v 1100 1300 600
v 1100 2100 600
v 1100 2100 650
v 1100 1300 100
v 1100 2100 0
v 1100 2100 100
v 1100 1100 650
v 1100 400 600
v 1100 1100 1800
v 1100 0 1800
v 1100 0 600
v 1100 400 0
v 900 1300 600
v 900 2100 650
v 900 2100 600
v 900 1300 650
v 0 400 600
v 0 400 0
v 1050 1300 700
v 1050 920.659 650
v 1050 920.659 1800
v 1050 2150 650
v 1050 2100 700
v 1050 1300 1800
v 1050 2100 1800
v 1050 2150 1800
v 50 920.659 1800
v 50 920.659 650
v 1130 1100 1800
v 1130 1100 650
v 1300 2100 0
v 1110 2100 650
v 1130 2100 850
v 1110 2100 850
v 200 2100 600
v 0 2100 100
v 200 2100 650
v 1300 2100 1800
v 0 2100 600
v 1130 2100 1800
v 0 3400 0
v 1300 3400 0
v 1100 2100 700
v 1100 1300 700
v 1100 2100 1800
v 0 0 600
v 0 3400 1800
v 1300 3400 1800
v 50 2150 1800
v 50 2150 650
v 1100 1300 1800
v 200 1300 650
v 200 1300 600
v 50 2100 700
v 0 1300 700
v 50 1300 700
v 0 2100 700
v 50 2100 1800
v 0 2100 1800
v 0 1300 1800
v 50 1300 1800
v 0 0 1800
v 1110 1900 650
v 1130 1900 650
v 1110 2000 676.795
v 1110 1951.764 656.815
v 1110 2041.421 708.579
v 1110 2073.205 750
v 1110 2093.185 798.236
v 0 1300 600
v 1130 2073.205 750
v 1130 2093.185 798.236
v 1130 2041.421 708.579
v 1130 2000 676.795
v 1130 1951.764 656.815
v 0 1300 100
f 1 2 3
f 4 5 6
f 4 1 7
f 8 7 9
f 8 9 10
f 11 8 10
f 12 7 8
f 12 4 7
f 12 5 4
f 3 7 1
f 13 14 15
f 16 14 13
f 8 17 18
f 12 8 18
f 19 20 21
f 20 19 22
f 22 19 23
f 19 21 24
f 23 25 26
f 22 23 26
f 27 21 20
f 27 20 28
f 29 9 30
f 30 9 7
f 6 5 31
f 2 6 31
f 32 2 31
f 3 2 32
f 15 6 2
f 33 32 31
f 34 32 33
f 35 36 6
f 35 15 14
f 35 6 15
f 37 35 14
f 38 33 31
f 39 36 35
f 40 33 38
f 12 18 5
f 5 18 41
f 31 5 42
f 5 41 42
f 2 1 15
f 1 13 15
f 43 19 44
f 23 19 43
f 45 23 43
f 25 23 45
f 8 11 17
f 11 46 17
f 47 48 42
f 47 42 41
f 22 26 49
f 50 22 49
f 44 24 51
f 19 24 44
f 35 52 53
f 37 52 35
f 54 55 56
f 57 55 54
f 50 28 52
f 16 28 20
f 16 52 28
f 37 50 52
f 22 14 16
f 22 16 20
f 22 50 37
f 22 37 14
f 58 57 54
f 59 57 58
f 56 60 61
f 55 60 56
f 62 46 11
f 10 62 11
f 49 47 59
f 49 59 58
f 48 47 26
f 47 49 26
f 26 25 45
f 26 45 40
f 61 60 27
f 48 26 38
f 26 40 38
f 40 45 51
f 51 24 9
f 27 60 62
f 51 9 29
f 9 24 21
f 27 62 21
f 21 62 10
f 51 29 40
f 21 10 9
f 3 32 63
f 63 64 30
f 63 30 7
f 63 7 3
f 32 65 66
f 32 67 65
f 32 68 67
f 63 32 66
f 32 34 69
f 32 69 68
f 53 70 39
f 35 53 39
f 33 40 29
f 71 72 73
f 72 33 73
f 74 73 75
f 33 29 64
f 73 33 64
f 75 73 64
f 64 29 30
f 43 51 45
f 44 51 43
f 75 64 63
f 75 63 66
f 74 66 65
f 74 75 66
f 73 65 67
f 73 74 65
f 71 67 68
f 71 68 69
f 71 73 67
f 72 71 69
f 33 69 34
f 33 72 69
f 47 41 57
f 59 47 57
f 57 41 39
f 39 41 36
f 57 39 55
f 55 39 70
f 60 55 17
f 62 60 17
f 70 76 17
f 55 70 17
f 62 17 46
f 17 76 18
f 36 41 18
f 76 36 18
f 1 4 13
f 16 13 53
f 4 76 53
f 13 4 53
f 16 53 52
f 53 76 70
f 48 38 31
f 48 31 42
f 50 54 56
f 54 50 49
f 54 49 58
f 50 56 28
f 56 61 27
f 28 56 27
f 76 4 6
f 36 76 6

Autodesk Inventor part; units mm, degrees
ref_plane "YZ Plane" through (0, 0, 0) normal (1, 0, 0) x (0, 1, 0)
ref_plane "XZ Plane" through (0, 0, 0) normal (0, 1, 0) x (-1, 0, 0)
ref_plane "XY Plane" through (0, 0, 0) normal (0, 0, 1) x (1, 0, 0)
sketch "Sketch1" plane through (0, 0, 0) normal (0, 0, 1) x (1, 0, 0)
  line L0 (0, 0) -> (1300, 0)
  line L1 (1300, 3400) -> (0, 3400)
  line L2 (0, 3400) -> (0, 0)
  line L3 (1300, 2100) -> (1100, 2100)
  line L4 (1100, 2100) -> (1100, 0)
  line L5 (1300, 2100) -> (1300, 3400)
  dimension "d0" = 1300
extrude "Extrusion1" add sketch "Sketch1" along normal blind 1800
sketch "Sketch2" plane through (0, 0, 0) normal (-1, 0, 0) x (0, 0, 1)
  line L0 (0, 0) -> (1800, 0) projected
  line L1 (0, 0) -> (600, 0)
  line L2 (600, 0) -> (600, 400)
  line L3 (600, 400) -> (0, 400)
  line L4 (0, 400) -> (0, 0)
  line L5 (0, 3400) -> (1800, 3400) projected
  line L6 (0, 1300) -> (600, 1300)
  line L7 (600, 1300) -> (600, 2100)
  line L8 (600, 2100) -> (0, 2100)
  line L9 (0, 2100) -> (0, 1300)
  line L10 (600, 1300) -> (100, 1300)
  line L11 (100, 1300) -> (100, 2100)
  line L12 (100, 2100) -> (600, 2100)
  line L13 (600, 2100) -> (600, 1300)
  line L14 (600, 1300) -> (600, 400)
  line L15 (700, 2100) -> (1800, 2100)
  line L16 (1800, 2100) -> (1800, 1300)
  line L17 (1800, 1300) -> (700, 1300)
  line L18 (700, 1300) -> (700, 2100)
  dimension "d4" = 600
  dimension "d5" = 400
  dimension "d13" = 600
  dimension "d14" = 800
  dimension "d15" = 500
  dimension "d21" = 900
  dimension "d25" = 800
extrude "Extrusion2" cut sketch "Sketch2" against normal blind 1800 contours L4 L3 L2 L0 | L6 L11 L8 L7 | L15 L16 L17 L18
sketch "Sketch3" plane through (0, 0, 1800) normal (0, 0, 1) x (1, 0, 0)
  line L0 (50, 2150) -> (50, 920.6593)
  line L1 (1050, 920.6593) -> (1050, 2150)
  line L2 (1050, 2100) -> (1050, 2150)
  line L3 (1100, 2100) -> (1300, 2100) projected
  line L4 (1300, 2100) -> (1250, 2100)
  line L5 (1050, 2150) -> (50, 2150)
  line L6 (1050, 920.6593) -> (50, 920.6593)
extrude "Extrusion3" cut sketch "Sketch3" against normal blind 1150
sketch "Sketch6" plane through (0, 0, 650) normal (0, 0, 1) x (1, 0, 0)
  line L0 (1050, 1300) -> (1050, 2100) projected
  line L1 (0, 2100) -> (1100, 2100) projected
  line L2 (1050, 1300) -> (50, 1300)
  line L3 (50, 1300) -> (50, 2100)
  line L4 (50, 2100) -> (1050, 2100)
  line L5 (1050, 2100) -> (1050, 1300)
  line L6 (1050, 1700) -> (900, 1700)
  line L7 (900, 1700) -> (900, 2100)
  line L8 (900, 1700) -> (900, 1300)
  line L9 (50, 1700) -> (200, 1700)
  line L10 (200, 1700) -> (200, 1300)
  line L11 (200, 1700) -> (200, 2100)
  point P0 (0, 0)
  point P1 (1050, 49.9974)
  dimension "d32" = 1000
  dimension "d33" = 150
  dimension "d34" = 150
extrude "Extrusion6" cut sketch "Sketch6" against normal blind 150 contours L2 L10 L11 L1 L7 L8
sketch "Sketch7" plane through (1100, 400, 0) normal (1, 0, 0) x (0, 0, -1)
  line L0 (-1800, 700) -> (-650, 700)
  line L1 (-650, 520.6593) -> (-650, 1750) projected
  line L2 (-650, 720) -> (-650, 700)
  line L3 (-650, 720) -> (-1800, 720)
  line L4 (-1800, 900) -> (-1800, -400) projected
  line L5 (-1800, 700) -> (-1800, 720)
  point P0 (0, -400)
  point P1 (-650, -350.0026)
  point P2 (-650, 2950)
extrude "Extrusion7" add sketch "Sketch7" along normal blind 30
sketch "Sketch8" plane through (1100, 1120, 1800) normal (0, 1, 0) x (1, 0, 0)
  line L0 (30, 0) -> (30, 1150) projected
  line L1 (0, 0) -> (0, 1150) projected
  line L2 (30, 1150) -> (0, 1150)
  line L3 (0, 1150) -> (0, 0)
  line L4 (0, 0) -> (30, 0)
  line L5 (30, 0) -> (30, 1150)
  point P0 (-1100, 1800)
extrude "Extrusion8" add sketch "Sketch8" along normal blind 1000
sketch "Sketch9" plane through (1130, 400, 0) normal (1, 0, 0) x (0, 0, -1)
  line L0 (-650, 1700) -> (-650, 700) projected
  line L1 (-650, 1300) -> (-650, 1500)
  line L2 (-850, 1700) -> (-1050, 1700)
  arc A0 (-650, 1500) -> (-850, 1700) centre (-850, 1500) ccw
  line L3 (-650, 1700) -> (-1072.0308, 1700)
  line L4 (-1072.0308, 1700) -> (-1072.0308, 1153.2705)
  line L5 (-1072.0308, 1153.2705) -> (-650, 1153.2705)
  line L6 (-650, 1153.2705) -> (-650, 1700)
  point P0 (0, -400)
  dimension "d42" = 400
  dimension "d43" = 200
extrude "Extrusion9" cut sketch "Sketch9" against normal blind 20 contours L0 A0 L3
properties part number "InjectionMachine"
